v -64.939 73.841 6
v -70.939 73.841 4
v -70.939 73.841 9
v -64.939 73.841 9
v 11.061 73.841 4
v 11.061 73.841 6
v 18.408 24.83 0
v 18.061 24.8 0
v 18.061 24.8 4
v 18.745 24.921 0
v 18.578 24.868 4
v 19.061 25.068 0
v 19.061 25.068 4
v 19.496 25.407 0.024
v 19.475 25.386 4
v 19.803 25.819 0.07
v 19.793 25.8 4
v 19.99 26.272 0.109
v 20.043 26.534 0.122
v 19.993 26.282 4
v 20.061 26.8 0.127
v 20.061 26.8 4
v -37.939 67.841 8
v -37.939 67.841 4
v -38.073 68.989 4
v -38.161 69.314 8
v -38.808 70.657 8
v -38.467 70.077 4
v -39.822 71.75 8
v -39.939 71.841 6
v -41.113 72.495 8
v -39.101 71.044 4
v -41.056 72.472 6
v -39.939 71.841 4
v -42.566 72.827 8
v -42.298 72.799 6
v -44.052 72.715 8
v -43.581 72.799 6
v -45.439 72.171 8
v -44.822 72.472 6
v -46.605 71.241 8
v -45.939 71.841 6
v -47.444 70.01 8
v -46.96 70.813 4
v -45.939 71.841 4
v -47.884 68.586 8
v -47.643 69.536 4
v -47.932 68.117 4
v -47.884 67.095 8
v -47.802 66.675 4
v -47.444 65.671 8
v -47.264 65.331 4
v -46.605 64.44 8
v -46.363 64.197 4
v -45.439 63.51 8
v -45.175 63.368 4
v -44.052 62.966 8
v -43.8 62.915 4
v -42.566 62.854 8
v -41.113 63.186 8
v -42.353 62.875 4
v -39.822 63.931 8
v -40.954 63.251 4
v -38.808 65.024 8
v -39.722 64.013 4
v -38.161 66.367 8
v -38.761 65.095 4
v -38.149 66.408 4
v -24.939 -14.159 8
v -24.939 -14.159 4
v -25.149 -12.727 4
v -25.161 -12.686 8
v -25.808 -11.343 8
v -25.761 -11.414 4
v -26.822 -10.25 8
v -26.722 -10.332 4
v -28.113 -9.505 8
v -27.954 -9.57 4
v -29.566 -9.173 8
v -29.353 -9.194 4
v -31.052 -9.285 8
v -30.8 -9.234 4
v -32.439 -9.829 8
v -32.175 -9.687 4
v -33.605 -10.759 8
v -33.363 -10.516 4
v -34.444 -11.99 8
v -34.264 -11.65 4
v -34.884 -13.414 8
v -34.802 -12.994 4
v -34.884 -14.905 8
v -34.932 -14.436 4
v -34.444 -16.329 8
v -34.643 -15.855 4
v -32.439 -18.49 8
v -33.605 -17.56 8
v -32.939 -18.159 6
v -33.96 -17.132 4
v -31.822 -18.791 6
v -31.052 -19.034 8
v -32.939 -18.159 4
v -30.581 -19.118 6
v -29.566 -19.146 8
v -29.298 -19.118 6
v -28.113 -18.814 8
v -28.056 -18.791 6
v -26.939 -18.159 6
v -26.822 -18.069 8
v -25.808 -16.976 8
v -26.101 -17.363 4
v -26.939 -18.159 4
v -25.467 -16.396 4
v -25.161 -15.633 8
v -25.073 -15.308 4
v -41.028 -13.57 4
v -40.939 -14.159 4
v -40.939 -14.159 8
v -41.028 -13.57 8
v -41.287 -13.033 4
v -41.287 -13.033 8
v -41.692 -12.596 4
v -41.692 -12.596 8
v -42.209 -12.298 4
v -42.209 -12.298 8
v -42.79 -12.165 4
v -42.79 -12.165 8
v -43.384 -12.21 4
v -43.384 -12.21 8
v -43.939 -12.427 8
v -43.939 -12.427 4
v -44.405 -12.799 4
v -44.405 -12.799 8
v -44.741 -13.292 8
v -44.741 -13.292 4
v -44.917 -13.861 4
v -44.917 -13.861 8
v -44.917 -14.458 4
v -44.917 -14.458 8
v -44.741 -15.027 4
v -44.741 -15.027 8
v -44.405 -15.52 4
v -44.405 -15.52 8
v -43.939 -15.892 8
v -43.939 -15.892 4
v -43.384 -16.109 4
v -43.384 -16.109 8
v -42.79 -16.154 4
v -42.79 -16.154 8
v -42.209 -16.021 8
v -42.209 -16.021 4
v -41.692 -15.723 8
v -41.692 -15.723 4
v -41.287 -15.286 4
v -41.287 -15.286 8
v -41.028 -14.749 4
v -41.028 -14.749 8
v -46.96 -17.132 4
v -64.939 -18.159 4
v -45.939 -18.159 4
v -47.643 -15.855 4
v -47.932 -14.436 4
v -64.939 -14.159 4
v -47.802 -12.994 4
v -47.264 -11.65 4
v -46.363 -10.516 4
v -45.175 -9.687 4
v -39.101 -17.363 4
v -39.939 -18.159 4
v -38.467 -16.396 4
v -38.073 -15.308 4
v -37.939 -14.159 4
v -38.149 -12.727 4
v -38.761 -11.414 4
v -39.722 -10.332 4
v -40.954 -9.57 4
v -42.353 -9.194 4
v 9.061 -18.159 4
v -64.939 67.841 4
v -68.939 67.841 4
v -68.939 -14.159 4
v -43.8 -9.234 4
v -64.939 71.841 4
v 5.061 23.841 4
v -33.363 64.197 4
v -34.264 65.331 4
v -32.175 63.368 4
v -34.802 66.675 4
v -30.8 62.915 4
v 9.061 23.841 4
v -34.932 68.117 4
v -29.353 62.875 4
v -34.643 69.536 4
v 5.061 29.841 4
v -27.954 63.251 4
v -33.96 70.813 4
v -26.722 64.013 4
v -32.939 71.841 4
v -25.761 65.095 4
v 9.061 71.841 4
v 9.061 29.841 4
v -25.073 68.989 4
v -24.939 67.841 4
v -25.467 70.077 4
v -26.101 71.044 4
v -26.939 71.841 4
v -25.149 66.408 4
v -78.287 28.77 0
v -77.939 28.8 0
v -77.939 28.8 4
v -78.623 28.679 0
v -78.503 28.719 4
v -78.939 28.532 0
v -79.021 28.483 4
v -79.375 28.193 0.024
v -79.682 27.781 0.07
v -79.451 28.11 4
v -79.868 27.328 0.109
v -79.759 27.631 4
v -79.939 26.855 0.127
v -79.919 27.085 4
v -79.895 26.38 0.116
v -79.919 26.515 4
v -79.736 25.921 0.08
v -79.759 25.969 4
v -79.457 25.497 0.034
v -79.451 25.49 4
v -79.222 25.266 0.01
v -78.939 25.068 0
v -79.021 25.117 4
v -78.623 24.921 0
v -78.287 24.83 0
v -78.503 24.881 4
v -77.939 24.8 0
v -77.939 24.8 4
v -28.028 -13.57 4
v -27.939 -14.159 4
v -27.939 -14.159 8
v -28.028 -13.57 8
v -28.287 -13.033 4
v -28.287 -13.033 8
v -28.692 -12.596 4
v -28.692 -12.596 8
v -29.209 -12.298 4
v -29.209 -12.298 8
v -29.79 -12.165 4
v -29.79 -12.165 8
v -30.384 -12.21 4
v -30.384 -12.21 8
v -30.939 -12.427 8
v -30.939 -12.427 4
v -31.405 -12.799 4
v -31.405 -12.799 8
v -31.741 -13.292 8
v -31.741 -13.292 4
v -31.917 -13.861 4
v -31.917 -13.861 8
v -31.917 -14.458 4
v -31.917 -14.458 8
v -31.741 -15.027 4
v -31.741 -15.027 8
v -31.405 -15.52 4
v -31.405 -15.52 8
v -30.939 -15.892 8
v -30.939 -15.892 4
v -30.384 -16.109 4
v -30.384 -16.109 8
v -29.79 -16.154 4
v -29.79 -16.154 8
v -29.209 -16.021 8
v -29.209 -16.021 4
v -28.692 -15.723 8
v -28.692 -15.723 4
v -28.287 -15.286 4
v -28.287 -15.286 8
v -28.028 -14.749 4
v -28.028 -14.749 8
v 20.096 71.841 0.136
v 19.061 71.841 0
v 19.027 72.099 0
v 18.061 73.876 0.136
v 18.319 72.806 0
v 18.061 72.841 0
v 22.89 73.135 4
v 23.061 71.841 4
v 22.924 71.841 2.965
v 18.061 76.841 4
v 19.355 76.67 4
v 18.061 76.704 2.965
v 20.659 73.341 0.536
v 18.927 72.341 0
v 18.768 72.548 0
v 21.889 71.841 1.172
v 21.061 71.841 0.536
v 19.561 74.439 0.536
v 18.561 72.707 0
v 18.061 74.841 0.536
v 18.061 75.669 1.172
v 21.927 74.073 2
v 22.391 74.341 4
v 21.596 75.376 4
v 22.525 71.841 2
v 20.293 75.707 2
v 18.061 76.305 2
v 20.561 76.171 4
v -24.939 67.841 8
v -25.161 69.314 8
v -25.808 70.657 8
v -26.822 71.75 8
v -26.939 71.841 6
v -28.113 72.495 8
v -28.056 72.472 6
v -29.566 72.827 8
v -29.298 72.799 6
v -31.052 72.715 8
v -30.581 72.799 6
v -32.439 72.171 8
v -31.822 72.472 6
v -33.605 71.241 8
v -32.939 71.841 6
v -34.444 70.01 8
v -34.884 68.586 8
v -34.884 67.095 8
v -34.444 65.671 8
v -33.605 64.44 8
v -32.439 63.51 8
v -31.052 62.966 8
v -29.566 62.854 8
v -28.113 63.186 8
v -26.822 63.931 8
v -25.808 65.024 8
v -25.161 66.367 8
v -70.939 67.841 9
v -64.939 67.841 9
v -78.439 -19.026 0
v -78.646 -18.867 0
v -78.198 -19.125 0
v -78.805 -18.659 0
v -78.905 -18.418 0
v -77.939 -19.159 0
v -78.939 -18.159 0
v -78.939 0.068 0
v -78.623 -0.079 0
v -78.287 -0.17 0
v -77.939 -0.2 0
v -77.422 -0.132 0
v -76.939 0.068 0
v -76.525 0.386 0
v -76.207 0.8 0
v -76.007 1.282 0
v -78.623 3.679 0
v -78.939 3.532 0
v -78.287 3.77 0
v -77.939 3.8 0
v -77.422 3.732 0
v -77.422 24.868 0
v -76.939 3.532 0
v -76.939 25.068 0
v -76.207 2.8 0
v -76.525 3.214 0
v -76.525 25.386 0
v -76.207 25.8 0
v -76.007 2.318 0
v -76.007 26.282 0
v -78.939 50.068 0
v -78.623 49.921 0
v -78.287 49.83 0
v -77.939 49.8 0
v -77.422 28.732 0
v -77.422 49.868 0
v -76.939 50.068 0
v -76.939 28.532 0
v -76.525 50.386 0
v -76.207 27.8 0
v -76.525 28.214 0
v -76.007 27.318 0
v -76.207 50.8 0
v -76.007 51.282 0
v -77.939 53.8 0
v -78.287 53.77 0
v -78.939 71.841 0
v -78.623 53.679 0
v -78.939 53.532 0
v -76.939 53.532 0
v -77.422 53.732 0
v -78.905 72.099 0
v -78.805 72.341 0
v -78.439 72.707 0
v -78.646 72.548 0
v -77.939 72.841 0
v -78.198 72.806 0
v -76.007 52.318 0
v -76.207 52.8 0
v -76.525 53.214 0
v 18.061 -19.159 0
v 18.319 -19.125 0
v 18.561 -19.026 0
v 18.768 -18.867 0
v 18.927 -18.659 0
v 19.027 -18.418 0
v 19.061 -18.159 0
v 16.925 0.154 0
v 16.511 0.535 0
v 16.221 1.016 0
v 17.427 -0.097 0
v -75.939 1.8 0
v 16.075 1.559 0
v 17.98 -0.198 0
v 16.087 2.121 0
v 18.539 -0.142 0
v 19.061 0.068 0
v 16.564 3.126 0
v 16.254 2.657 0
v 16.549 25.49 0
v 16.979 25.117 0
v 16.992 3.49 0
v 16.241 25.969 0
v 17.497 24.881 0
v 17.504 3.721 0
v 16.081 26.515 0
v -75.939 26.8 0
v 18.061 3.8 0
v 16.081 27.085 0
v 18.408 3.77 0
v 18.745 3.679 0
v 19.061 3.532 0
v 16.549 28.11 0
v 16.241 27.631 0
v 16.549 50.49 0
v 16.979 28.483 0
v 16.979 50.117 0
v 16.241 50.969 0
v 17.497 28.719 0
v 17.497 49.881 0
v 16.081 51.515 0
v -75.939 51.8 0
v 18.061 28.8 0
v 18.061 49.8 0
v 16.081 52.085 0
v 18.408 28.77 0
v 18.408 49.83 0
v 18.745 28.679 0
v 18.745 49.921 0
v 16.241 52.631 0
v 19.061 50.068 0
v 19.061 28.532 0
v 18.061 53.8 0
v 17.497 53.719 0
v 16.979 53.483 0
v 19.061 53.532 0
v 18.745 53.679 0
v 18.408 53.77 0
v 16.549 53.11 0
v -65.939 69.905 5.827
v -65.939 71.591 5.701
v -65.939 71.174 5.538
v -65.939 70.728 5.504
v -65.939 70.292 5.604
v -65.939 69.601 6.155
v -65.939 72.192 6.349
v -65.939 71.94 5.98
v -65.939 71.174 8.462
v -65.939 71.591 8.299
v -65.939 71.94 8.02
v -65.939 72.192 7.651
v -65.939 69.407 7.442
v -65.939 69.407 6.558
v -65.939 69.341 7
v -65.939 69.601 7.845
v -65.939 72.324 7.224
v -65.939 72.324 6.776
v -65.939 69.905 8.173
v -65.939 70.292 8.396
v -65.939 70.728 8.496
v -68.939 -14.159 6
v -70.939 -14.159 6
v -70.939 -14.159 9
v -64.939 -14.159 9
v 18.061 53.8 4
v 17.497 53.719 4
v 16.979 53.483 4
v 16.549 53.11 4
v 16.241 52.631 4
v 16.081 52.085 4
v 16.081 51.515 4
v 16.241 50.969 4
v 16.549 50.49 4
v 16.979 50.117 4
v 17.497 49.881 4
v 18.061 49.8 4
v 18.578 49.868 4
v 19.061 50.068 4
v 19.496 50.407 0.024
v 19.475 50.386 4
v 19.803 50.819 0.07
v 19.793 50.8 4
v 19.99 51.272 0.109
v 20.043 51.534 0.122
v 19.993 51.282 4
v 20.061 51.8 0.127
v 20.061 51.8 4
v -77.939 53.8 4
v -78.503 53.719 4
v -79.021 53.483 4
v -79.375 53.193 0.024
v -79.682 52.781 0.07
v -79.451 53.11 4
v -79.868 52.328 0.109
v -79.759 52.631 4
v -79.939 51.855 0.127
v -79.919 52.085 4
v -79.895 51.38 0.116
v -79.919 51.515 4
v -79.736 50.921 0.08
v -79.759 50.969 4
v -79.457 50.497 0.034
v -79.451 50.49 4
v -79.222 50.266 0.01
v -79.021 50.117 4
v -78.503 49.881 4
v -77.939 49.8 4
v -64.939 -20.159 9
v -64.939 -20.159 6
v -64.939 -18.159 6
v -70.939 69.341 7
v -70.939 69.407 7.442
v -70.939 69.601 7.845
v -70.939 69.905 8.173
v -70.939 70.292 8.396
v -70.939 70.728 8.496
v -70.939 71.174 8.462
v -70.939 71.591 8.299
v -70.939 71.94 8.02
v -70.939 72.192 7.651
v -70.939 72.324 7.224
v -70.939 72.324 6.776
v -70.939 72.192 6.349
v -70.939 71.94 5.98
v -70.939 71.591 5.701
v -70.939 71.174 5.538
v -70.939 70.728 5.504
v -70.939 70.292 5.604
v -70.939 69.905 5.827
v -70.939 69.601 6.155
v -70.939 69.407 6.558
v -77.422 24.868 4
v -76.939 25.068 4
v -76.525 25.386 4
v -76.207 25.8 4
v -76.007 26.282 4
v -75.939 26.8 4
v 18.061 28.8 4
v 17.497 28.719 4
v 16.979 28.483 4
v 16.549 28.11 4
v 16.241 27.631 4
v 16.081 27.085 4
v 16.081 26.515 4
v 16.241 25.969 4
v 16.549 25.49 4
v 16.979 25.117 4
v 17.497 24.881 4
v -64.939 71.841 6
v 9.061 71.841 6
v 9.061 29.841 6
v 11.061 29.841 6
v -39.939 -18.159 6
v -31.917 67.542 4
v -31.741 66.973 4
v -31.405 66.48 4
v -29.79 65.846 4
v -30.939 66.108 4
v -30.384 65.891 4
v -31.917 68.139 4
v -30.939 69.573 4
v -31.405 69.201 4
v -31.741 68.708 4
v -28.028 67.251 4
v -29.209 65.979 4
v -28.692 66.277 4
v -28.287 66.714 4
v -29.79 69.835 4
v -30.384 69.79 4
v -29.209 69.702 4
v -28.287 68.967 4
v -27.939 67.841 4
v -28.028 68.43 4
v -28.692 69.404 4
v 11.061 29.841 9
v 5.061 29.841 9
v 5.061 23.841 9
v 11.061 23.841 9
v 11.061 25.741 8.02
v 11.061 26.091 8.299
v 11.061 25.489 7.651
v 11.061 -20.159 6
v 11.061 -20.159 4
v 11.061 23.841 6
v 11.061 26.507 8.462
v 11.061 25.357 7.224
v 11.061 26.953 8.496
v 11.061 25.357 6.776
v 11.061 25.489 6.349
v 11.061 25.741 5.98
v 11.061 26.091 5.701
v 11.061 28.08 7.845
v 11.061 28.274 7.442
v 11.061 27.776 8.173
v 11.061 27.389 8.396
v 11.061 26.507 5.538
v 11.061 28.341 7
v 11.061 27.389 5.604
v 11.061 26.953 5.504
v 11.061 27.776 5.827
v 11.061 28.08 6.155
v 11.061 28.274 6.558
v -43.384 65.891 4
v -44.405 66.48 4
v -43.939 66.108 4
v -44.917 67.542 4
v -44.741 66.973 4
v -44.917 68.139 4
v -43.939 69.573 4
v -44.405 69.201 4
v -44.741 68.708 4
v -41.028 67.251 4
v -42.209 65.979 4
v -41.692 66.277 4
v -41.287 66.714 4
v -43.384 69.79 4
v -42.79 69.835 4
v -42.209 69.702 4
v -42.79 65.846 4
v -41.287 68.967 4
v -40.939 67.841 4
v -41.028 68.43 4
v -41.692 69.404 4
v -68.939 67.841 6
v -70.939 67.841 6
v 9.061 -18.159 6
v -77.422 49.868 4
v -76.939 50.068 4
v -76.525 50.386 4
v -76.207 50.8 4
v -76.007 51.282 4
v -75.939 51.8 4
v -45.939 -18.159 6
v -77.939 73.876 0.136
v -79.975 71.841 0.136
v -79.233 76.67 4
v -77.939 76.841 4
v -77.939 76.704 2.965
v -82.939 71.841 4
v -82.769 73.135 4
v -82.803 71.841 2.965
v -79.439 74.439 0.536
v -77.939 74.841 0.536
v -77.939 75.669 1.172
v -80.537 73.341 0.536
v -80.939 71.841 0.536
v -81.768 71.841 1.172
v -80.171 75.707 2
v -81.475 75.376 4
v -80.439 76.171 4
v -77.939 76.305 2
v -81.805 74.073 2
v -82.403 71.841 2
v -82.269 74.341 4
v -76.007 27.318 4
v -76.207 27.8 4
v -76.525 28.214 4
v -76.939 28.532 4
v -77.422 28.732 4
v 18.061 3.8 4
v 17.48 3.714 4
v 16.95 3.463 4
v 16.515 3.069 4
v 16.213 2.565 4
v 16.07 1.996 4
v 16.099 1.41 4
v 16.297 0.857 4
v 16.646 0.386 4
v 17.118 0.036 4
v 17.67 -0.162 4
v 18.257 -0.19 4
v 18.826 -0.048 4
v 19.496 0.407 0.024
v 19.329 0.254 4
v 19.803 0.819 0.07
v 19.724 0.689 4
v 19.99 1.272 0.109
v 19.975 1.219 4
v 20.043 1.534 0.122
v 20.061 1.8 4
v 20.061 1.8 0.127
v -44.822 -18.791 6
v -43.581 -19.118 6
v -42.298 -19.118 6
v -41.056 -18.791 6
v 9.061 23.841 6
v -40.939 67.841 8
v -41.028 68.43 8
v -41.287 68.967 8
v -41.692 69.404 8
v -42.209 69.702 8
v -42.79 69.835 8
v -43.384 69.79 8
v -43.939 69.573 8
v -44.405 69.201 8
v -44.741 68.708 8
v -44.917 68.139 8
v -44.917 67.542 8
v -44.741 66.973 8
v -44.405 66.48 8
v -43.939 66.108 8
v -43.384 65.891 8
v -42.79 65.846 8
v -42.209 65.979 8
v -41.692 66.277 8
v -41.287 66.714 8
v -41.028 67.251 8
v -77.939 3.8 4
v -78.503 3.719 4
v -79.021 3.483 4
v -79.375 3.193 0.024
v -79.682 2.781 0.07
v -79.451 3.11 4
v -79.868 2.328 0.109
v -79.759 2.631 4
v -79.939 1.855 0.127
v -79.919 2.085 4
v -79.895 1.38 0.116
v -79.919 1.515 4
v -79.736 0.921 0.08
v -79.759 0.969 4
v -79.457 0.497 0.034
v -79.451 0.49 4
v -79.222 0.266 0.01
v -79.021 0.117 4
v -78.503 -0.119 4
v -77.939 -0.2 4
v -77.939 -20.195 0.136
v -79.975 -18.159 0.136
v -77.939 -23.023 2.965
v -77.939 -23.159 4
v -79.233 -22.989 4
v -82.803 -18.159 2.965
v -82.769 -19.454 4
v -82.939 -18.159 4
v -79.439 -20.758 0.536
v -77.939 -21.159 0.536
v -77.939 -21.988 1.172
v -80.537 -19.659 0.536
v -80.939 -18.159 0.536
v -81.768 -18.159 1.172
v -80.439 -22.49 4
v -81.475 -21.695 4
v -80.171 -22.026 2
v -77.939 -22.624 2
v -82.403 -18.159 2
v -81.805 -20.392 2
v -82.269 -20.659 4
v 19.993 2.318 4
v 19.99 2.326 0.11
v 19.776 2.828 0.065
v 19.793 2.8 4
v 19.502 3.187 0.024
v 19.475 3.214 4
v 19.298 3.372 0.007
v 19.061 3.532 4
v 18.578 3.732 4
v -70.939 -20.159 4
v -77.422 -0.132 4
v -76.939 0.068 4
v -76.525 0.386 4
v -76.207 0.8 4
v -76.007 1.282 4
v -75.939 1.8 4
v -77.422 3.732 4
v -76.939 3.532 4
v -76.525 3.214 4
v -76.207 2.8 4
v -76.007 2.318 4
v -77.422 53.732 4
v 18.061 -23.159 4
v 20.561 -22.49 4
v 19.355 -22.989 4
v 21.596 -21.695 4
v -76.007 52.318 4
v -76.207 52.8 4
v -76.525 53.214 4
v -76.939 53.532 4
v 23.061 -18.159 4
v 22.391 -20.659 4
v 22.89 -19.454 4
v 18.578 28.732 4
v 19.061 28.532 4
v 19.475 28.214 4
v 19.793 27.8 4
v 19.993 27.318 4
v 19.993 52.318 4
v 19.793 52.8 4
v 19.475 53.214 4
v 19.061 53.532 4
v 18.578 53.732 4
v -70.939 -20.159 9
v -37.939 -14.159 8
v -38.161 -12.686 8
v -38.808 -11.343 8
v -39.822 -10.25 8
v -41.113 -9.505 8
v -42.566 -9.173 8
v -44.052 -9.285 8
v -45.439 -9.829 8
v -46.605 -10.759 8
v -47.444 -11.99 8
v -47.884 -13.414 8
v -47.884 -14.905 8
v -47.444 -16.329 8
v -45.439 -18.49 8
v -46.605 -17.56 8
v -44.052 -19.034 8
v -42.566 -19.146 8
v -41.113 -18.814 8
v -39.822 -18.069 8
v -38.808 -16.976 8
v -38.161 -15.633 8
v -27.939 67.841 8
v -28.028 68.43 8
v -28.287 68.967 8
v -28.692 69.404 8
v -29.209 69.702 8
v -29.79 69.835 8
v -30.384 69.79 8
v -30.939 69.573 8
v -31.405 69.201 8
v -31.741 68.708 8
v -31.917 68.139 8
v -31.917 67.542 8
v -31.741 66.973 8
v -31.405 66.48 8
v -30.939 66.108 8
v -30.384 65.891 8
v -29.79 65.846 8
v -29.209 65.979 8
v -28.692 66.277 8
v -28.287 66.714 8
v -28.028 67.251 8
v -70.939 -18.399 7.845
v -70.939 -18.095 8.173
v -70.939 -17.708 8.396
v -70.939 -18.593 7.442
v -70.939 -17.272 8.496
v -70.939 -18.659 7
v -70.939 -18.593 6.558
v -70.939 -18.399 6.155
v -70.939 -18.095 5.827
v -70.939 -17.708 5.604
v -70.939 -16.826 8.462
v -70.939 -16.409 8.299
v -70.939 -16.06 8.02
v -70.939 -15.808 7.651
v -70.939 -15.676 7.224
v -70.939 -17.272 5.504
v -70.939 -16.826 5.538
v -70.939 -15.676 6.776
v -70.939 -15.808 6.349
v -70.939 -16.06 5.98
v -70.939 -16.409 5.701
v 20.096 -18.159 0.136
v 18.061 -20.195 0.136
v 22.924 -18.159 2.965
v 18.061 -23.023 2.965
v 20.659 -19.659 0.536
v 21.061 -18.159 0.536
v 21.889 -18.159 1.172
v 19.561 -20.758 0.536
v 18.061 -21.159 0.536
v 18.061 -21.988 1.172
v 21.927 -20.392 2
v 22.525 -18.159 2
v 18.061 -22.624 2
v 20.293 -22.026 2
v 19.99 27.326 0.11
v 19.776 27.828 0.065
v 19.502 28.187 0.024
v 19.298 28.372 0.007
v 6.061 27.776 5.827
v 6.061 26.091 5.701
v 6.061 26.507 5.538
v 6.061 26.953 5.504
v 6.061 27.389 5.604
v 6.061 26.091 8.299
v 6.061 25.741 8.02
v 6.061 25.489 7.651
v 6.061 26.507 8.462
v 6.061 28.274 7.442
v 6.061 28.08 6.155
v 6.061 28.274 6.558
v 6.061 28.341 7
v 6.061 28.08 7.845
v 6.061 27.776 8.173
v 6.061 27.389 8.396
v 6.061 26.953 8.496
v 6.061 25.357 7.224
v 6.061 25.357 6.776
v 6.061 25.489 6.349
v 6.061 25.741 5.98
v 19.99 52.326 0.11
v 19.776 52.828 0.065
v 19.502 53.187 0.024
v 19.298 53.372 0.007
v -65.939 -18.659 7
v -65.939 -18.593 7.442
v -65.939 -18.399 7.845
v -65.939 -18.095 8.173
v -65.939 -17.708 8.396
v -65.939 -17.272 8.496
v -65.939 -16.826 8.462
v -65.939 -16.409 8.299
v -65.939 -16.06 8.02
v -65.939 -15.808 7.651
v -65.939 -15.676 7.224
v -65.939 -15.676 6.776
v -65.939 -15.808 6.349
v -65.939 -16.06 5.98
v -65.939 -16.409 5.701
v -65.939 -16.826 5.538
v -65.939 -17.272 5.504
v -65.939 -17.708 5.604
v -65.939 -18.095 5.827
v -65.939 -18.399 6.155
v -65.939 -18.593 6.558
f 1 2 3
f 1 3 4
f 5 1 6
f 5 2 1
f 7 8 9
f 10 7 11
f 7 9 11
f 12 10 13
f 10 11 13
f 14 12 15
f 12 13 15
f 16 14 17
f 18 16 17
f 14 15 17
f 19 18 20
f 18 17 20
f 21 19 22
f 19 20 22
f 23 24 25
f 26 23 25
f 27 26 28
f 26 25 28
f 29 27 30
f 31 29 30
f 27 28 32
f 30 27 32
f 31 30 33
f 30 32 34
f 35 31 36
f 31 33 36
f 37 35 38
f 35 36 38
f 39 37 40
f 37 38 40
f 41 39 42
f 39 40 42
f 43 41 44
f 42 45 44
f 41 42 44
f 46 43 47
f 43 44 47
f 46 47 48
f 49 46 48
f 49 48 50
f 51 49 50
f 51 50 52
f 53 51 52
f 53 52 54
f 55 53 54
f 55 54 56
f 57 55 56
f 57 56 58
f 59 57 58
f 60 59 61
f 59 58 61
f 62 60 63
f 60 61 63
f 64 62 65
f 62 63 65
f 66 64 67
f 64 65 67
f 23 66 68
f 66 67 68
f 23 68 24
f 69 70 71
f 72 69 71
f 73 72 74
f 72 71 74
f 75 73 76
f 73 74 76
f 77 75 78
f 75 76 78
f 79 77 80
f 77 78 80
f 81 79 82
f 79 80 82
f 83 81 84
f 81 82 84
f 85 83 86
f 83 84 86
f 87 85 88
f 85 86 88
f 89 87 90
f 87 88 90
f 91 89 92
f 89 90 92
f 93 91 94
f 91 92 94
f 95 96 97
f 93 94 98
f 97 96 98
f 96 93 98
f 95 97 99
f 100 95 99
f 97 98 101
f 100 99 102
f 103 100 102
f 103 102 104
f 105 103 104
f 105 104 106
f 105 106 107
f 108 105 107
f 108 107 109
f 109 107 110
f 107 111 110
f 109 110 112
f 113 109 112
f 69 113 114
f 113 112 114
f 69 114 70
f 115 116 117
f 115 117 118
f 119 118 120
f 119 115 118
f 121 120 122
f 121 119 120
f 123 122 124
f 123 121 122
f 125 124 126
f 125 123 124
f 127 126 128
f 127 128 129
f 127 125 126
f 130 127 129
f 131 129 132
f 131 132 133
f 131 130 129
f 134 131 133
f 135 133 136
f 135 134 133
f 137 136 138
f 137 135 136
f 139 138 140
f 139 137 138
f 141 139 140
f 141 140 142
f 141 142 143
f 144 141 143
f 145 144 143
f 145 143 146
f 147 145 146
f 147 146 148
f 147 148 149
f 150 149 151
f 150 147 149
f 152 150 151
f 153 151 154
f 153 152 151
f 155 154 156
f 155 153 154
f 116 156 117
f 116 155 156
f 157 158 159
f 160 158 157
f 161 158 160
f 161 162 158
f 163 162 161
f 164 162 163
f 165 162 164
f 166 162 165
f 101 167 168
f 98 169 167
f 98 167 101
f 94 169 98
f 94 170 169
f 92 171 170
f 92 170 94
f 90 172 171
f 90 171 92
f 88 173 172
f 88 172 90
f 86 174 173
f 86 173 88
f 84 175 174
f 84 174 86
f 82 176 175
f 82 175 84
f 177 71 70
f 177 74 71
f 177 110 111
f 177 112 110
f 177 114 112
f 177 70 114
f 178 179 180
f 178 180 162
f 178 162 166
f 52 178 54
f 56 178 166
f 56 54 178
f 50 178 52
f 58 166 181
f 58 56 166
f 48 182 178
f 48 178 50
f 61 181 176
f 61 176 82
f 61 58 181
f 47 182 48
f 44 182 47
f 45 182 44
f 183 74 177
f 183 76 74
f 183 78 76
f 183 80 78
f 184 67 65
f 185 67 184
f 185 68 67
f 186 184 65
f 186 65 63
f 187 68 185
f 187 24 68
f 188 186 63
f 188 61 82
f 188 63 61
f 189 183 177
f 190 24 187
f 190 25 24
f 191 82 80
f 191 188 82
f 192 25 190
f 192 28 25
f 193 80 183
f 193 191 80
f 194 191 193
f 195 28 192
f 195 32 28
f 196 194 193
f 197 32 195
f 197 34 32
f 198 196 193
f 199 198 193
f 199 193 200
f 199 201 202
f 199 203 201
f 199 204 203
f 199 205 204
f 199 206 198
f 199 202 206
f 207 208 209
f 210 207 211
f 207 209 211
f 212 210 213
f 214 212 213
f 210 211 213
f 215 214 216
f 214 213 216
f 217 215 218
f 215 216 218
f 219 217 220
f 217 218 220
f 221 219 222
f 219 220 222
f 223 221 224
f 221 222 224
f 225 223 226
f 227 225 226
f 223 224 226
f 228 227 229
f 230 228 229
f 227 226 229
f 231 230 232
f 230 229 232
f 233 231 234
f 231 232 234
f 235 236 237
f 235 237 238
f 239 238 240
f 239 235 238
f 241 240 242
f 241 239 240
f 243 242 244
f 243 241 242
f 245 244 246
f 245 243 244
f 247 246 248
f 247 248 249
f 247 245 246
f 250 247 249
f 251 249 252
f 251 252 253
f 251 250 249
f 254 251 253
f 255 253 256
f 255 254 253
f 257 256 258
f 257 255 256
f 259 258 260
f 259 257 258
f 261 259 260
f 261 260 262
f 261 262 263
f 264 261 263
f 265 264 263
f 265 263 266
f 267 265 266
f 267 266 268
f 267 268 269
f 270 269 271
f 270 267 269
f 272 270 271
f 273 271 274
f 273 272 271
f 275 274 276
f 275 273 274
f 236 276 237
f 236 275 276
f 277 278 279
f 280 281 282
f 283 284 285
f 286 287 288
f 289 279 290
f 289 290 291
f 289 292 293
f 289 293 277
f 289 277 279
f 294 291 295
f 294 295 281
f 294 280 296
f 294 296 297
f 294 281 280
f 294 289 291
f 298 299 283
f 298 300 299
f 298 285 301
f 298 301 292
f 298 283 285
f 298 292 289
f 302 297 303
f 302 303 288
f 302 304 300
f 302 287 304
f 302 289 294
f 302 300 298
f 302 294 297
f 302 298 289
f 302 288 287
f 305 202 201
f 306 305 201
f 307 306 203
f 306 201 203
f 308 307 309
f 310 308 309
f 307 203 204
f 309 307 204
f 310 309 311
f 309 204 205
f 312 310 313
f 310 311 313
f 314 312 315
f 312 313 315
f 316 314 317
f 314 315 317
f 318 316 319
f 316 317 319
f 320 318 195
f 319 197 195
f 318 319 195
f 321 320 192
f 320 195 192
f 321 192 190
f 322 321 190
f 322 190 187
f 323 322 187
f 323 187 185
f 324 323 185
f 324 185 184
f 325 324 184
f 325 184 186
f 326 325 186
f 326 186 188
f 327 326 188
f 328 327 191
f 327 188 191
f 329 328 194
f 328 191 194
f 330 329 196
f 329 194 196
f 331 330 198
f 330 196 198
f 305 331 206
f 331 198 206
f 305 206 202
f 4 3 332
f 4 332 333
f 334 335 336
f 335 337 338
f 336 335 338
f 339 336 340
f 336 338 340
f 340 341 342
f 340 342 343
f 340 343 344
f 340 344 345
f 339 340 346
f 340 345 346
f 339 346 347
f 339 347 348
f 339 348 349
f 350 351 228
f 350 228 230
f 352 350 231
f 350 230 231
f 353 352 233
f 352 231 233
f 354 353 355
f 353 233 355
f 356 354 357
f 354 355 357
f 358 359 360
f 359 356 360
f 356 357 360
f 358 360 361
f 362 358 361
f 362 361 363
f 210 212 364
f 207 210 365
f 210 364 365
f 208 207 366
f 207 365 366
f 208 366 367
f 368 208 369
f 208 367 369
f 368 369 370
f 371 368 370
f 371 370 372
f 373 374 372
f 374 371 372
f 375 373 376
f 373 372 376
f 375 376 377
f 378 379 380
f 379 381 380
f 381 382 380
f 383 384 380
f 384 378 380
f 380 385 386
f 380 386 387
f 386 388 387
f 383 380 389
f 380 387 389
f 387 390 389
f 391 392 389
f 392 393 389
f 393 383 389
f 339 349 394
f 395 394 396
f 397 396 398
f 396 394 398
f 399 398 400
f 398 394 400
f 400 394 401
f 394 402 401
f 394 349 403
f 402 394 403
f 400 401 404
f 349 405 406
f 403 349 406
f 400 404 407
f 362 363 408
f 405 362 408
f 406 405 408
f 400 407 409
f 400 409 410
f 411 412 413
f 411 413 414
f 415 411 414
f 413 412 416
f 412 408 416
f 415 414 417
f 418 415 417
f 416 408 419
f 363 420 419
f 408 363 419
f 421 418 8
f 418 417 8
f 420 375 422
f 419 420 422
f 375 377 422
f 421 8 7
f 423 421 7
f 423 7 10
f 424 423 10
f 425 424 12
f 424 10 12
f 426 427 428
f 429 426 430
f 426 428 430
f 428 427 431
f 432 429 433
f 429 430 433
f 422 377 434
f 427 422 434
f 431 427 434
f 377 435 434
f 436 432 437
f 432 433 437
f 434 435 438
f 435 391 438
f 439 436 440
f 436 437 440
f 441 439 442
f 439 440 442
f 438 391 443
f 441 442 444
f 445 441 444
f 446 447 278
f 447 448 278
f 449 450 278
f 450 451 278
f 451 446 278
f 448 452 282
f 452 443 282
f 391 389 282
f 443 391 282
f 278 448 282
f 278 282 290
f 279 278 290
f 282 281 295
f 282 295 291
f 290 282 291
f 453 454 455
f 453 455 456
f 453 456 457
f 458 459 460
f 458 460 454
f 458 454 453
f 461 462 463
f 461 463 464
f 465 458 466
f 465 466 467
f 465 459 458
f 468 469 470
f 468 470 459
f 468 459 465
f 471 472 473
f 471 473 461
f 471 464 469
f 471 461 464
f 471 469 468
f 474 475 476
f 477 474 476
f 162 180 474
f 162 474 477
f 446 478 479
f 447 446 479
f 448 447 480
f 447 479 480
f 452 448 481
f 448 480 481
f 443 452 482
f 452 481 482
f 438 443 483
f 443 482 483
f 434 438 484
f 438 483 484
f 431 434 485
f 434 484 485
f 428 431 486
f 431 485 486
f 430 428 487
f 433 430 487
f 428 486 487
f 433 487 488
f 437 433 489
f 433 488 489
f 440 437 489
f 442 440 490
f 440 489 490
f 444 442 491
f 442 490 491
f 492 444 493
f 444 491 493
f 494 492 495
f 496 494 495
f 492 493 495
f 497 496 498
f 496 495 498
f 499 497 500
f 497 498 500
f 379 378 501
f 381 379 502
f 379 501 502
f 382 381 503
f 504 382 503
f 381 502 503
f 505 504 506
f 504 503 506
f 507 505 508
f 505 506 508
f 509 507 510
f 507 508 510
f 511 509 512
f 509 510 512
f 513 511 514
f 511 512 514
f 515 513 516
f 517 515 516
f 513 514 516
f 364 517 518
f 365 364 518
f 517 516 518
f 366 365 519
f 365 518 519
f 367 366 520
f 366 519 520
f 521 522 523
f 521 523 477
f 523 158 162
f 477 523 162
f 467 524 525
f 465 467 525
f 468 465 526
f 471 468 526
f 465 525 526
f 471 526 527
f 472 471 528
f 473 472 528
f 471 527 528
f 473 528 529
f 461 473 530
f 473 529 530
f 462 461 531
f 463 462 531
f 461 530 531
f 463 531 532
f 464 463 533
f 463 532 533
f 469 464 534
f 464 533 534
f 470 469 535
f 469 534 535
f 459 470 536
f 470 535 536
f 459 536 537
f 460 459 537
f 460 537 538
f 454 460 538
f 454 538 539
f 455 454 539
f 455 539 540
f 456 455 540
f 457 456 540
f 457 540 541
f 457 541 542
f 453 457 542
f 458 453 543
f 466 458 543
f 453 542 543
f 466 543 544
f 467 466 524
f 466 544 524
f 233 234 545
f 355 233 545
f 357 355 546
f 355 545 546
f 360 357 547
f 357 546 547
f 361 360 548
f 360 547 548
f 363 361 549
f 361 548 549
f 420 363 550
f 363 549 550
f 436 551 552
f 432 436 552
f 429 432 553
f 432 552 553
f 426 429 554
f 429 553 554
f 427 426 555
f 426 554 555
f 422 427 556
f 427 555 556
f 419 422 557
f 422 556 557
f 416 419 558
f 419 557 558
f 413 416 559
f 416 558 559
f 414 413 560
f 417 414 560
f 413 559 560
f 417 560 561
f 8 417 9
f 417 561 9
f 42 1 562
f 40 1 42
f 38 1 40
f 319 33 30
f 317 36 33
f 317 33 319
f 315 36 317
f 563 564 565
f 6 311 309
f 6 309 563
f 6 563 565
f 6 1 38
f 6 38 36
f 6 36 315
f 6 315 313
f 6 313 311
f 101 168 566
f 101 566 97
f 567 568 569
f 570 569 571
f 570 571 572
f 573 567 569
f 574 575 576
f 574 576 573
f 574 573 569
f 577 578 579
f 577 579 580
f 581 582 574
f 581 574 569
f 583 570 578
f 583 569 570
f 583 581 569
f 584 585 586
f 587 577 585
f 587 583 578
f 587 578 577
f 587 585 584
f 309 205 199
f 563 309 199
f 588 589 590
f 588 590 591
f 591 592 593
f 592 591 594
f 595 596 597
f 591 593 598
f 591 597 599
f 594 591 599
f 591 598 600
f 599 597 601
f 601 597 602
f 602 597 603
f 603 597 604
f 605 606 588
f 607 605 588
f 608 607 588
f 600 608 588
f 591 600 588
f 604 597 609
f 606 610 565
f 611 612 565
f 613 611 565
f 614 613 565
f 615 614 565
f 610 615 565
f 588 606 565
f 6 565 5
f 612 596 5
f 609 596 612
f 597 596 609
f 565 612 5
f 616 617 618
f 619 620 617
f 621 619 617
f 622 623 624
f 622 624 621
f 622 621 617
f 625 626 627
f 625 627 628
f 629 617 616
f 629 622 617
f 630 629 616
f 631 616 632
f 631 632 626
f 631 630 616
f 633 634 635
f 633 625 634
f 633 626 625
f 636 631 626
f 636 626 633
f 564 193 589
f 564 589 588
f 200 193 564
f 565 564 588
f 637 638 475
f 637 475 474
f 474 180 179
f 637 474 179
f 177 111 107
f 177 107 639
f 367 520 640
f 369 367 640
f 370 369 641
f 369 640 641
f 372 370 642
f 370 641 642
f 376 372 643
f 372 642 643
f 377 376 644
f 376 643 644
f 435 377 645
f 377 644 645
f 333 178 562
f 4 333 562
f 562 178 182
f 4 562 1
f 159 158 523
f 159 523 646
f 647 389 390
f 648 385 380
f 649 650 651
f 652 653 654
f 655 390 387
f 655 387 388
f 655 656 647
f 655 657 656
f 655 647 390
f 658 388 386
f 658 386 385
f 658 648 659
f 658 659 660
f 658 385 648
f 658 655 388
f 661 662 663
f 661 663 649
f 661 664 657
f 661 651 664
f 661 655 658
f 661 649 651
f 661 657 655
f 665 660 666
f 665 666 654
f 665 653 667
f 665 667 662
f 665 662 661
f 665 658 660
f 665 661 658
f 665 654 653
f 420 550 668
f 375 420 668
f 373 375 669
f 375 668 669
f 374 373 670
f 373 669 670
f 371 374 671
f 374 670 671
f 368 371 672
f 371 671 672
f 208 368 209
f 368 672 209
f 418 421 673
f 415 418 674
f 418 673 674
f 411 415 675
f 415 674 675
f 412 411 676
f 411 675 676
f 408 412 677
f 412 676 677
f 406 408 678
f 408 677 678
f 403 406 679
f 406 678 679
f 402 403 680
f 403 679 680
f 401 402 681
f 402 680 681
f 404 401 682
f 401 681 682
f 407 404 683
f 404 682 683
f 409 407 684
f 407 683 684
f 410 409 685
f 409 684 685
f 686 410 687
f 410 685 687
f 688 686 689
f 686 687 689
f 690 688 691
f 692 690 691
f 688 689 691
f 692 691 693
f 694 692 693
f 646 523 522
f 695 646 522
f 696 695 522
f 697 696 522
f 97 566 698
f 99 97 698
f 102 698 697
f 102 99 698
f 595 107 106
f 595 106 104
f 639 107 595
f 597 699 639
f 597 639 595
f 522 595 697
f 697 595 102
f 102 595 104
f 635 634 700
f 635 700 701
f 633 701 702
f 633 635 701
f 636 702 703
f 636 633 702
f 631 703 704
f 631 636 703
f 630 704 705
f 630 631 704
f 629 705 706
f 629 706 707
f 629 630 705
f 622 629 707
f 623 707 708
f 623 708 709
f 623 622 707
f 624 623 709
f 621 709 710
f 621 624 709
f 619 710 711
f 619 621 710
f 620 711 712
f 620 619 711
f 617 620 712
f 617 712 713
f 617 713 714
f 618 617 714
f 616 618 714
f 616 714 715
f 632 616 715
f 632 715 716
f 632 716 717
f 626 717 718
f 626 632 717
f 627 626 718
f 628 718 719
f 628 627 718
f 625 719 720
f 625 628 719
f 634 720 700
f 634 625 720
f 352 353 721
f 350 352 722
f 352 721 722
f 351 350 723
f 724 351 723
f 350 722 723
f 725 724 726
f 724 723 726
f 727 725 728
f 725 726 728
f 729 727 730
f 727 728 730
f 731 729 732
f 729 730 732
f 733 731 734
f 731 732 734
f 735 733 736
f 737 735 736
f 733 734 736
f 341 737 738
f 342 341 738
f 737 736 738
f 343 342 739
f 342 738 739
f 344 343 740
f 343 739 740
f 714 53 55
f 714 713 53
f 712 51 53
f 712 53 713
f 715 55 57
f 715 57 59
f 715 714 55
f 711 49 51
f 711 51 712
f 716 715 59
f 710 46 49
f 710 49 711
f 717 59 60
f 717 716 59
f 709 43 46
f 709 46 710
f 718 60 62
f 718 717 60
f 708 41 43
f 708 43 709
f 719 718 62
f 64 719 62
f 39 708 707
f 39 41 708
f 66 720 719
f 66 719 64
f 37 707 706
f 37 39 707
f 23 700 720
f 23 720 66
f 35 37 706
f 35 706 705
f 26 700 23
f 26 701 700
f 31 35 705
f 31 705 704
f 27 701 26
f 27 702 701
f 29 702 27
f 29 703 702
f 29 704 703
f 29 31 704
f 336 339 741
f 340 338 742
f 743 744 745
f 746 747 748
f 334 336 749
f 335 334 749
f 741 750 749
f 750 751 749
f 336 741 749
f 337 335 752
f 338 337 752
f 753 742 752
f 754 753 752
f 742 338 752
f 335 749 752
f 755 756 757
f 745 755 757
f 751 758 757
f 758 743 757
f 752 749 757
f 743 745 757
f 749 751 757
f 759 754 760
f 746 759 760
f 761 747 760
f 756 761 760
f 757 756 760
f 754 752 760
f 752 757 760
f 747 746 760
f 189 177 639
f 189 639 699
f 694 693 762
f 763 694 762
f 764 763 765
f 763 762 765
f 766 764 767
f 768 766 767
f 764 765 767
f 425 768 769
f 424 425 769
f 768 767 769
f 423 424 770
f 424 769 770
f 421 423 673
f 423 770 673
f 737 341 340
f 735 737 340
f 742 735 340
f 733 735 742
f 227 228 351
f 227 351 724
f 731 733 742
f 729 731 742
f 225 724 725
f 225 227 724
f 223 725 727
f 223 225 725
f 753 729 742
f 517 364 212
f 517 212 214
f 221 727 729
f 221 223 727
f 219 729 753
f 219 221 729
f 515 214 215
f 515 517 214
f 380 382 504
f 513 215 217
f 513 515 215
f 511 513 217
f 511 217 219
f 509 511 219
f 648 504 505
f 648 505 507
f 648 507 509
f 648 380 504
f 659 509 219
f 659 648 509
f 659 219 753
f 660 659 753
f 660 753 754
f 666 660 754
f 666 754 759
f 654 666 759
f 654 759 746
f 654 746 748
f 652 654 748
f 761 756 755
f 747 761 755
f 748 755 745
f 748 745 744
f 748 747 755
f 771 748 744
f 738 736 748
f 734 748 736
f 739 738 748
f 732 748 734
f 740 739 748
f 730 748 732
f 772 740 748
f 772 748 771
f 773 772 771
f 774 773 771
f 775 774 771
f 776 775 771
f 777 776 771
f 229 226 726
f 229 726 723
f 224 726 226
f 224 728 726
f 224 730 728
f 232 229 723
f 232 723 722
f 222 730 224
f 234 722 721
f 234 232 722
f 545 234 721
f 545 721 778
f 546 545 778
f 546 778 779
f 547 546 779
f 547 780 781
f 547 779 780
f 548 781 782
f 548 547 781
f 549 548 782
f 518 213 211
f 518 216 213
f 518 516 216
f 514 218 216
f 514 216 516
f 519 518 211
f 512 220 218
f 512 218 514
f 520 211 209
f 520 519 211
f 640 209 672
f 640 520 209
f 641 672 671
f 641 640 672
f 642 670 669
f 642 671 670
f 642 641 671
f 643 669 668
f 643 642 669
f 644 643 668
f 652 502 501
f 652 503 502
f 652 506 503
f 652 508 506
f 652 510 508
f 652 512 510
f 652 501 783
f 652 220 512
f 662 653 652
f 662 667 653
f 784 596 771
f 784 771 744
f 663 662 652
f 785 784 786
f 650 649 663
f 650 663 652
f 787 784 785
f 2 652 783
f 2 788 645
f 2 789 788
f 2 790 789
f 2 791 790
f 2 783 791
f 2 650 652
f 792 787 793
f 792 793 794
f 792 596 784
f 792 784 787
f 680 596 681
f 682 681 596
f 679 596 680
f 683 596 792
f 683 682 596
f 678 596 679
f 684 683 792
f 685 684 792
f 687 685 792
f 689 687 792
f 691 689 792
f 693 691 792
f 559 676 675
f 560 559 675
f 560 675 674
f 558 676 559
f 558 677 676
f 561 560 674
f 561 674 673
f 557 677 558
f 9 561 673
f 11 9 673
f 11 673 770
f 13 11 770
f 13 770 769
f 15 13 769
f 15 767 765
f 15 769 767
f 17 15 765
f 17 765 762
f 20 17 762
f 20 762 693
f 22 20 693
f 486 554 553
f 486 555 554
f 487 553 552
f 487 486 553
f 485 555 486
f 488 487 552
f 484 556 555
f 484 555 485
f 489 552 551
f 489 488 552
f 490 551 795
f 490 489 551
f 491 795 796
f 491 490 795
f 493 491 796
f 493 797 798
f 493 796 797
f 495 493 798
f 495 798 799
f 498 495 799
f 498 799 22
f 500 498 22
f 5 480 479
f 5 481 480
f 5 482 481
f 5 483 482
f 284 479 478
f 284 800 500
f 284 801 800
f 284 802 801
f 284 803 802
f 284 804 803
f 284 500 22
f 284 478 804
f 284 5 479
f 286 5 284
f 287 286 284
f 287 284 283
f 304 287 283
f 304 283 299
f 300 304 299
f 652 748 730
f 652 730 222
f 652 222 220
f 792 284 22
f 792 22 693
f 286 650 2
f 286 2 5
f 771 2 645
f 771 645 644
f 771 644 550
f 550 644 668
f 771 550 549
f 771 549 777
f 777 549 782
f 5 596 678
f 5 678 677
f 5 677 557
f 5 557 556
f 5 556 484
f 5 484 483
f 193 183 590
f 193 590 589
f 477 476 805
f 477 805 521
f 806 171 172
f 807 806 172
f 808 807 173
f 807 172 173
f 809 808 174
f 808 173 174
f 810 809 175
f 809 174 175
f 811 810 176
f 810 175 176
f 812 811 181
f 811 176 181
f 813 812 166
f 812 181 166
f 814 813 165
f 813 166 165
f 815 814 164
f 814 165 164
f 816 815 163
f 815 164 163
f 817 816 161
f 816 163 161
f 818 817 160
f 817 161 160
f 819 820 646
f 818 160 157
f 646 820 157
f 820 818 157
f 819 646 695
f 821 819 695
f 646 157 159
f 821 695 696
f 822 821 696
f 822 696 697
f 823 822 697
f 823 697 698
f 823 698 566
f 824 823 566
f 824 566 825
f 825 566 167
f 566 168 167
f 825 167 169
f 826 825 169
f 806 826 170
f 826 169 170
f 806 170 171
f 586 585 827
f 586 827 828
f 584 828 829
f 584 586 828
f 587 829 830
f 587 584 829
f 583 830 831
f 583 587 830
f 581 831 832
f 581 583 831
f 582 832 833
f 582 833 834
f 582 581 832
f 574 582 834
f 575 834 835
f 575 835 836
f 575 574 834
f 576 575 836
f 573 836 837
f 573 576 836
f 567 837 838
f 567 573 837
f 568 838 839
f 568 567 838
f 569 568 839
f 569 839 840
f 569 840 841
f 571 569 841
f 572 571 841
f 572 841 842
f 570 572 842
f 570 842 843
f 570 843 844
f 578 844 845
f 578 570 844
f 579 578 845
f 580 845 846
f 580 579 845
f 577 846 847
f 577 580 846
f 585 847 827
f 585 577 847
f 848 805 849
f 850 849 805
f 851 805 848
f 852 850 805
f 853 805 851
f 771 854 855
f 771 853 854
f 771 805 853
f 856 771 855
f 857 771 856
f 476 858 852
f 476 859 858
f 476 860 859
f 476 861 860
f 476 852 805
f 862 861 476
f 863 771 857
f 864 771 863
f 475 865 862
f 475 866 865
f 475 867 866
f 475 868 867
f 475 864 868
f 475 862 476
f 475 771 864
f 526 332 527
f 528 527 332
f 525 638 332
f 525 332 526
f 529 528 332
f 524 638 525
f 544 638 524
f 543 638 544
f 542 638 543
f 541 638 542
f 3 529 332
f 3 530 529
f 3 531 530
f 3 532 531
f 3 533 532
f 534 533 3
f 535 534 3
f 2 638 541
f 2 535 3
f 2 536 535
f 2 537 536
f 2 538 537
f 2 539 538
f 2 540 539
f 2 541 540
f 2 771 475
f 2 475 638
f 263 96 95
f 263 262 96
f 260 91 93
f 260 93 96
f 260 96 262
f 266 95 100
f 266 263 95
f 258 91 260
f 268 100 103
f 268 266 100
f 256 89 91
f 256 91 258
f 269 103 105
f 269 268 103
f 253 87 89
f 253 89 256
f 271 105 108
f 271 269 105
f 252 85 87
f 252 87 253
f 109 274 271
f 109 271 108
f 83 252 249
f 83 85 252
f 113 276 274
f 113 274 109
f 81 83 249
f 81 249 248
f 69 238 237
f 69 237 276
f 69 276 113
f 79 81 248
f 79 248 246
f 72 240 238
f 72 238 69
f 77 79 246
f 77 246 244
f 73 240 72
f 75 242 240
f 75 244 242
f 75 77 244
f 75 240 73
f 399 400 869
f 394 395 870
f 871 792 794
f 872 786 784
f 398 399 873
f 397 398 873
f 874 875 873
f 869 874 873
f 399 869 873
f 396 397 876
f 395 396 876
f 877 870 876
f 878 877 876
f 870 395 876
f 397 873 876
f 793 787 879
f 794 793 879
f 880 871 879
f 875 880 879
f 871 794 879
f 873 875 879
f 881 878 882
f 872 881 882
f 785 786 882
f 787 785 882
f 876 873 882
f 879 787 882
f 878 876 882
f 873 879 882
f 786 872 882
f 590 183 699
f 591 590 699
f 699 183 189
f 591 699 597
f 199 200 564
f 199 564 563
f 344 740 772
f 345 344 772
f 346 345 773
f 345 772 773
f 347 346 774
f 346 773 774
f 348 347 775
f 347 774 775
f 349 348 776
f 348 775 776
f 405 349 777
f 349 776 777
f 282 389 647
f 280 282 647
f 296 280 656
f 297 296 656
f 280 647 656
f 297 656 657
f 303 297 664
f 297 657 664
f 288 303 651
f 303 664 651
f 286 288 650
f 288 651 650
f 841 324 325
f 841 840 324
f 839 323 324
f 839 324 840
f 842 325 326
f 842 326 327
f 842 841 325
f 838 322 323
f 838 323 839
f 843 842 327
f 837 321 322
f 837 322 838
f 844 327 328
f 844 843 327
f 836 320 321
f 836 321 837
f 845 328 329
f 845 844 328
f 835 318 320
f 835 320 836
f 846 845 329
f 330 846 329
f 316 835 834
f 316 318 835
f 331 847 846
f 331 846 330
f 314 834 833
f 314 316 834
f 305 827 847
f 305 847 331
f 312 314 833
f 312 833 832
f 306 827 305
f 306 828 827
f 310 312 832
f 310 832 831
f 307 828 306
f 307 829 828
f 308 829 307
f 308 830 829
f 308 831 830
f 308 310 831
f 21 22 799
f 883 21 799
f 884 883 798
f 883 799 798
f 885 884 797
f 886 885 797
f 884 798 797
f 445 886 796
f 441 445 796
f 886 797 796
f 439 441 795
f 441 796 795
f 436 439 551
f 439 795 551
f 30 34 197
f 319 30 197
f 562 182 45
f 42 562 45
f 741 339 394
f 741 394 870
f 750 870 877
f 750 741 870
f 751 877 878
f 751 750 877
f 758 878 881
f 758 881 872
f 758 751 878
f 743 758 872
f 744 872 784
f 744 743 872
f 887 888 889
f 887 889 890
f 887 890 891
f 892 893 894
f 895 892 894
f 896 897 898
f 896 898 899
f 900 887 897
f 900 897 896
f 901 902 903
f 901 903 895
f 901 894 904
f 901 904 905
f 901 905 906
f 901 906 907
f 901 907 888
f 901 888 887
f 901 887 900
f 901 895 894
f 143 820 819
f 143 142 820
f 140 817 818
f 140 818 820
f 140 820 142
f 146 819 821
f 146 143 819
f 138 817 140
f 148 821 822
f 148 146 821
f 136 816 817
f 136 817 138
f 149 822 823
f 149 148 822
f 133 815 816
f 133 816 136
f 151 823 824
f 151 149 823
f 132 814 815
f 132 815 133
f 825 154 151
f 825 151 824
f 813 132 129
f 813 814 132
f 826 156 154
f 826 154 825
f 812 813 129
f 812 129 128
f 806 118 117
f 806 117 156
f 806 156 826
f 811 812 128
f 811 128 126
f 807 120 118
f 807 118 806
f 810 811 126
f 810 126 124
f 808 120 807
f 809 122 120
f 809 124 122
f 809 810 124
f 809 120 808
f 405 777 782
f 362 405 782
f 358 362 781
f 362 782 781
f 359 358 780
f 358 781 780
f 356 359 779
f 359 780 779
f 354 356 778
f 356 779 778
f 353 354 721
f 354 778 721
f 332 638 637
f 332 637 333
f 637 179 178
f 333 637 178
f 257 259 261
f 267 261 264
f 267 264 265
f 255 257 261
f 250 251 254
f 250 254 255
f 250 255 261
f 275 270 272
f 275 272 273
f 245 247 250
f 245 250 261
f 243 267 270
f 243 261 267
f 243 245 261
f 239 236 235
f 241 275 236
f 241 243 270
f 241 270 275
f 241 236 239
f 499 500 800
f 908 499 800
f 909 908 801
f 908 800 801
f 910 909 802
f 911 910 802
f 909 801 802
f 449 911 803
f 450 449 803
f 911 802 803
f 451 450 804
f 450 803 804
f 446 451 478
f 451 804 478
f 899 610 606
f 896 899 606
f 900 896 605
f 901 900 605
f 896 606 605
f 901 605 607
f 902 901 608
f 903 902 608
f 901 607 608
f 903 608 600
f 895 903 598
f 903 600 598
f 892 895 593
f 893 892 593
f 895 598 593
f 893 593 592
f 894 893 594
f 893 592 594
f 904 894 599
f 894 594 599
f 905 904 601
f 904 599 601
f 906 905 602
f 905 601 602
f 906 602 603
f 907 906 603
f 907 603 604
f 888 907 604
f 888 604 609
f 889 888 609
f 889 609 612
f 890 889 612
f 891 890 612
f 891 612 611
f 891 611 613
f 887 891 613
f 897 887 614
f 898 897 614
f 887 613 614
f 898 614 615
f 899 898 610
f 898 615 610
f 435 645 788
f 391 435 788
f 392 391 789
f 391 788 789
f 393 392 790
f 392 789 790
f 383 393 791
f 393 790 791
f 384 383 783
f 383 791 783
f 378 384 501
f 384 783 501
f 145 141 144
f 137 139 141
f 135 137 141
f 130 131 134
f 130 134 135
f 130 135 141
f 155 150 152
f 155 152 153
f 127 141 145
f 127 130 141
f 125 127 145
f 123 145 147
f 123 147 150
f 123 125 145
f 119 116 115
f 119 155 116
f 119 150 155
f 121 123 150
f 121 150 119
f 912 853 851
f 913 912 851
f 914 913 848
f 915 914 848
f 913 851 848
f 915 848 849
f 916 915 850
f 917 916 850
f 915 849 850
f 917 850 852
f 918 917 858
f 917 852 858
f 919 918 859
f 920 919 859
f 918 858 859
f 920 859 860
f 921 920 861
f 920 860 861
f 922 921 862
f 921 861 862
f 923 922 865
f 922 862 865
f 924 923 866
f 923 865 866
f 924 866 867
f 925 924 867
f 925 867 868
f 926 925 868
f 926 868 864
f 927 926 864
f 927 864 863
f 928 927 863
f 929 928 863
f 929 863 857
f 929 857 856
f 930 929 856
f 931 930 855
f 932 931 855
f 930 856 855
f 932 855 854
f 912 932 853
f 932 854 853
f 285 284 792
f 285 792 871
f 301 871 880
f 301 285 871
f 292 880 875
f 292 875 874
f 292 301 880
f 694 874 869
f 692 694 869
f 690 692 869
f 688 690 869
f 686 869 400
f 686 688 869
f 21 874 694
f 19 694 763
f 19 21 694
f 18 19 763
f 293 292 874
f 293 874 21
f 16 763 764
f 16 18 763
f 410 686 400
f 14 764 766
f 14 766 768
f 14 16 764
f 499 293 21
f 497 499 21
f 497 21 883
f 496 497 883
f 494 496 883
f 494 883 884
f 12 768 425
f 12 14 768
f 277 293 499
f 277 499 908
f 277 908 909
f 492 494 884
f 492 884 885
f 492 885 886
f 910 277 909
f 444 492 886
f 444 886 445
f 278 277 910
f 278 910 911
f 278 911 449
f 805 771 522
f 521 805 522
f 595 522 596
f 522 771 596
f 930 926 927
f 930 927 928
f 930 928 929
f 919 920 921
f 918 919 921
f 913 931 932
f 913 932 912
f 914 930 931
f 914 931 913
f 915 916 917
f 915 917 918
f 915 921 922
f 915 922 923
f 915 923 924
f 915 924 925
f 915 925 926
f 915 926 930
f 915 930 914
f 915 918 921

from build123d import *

# Parameters (mm, degrees)
F0_W          = 106
F0_H          = 100
F1_DEPTH      = 4
F2_W          = 82
F2_H          = 94
F2_W_2        = 78
F2_H_2        = 90
F5_DEPTH      = 2
F6_DEPTH      = 25
F4_R          = 5
F4_R_2        = 2
F7_DEPTH      = 4
F8_W          = 6
F8_H          = 6
F9_DEPTH      = 5
F10_R         = 1.5
F11_DEPTH     = 5
F12_W         = 6
F12_H         = 6
F13_DEPTH     = 5
F14_R         = 1.5
F15_DEPTH     = 5
F16_R         = 5
F17_T1_DEPTH  = 90
F17_T3_DEPTH  = 96
F17_T6_ANGLE  = 90
F17_T8_ANGLE  = 90
F17_T10_ANGLE = 90
F17_T12_ANGLE = 90


# Not quite as in the source:
# - a fillet or chamfer that OpenCascade refuses, or shapes differently, is made with other operations: its cross-section is extruded or revolved along the edge and cut away or added


with BuildPart() as f1:
    # F0 (on Top) → F1 (new body)
    with BuildSketch(Plane.XY):
        with Locations((-29.9393483698, 26.8405017372)):
            Rectangle(F0_W, F0_H)
    extrude(amount=F1_DEPTH)

    # F2 (on face) → F5 (join)
    with BuildSketch(Plane.XY.offset(4)):
        with Locations((-29.9393483698, 26.8405017372)):
            Rectangle(F2_W, F2_H)
        with Locations((-29.9393483698, 26.8405017372)):
            Rectangle(F2_W_2, F2_H_2, mode=Mode.SUBTRACT)
    extrude(amount=F5_DEPTH)

    # F3 (on face) → F6 (cut)
    with BuildSketch(Plane.XY.offset(4)):
        with BuildLine():
            ThreePointArc((-77.9393483698, 49.7999965698), (-76.5251348075, 50.3857830074), (-75.9393483698, 51.7999965698))
            ThreePointArc((-75.9393483698, 51.7999965698), (-76.5251348075, 53.2142101321), (-77.9393483698, 53.7999965698))
            Line((-77.9393483698, 53.7999965698), (-77.9393483698, 51.7999965698))
            Line((-77.9393483698, 51.7999965698), (-77.9393483698, 49.7999965698))
        make_face()
        with BuildLine():
            ThreePointArc((-75.9393483698, 1.7999965698), (-76.5251348075, 3.2142101321), (-77.9393483698, 3.7999965698))
            Line((-77.9393483698, 3.7999965698), (-77.9393483698, 1.7999965698))
            Line((-77.9393483698, 1.7999965698), (-77.9393483698, -0.2000034302))
            ThreePointArc((-77.9393483698, -0.2000034302), (-76.5251348075, 0.3857830074), (-75.9393483698, 1.7999965698))
        make_face()
        with BuildLine():
            Line((-77.9393483698, 1.7999965698), (-77.9393483698, 3.7999965698))
            ThreePointArc((-77.9393483698, 3.7999965698), (-79.9393483698, 1.7999965698), (-77.9393483698, -0.2000034302))
            Line((-77.9393483698, -0.2000034302), (-77.9393483698, 1.7999965698))
        make_face()
        with BuildLine():
            ThreePointArc((-75.9393483698, 26.7999965698), (-76.5251348075, 28.2142101321), (-77.9393483698, 28.7999965698))
            Line((-77.9393483698, 28.7999965698), (-77.9393483698, 26.7999965698))
            Line((-77.9393483698, 26.7999965698), (-77.9393483698, 24.7999965698))
            ThreePointArc((-77.9393483698, 24.7999965698), (-76.5251348075, 25.3857830074), (-75.9393483698, 26.7999965698))
        make_face()
        with BuildLine():
            Line((-77.9393483698, 26.7999965698), (-77.9393483698, 28.7999965698))
            ThreePointArc((-77.9393483698, 28.7999965698), (-79.9393483698, 26.7999965698), (-77.9393483698, 24.7999965698))
            Line((-77.9393483698, 24.7999965698), (-77.9393483698, 26.7999965698))
        make_face()
        with BuildLine():
            Line((-77.9393483698, 51.7999965698), (-77.9393483698, 53.7999965698))
            ThreePointArc((-77.9393483698, 53.7999965698), (-79.9393483698, 51.7999965698), (-77.9393483698, 49.7999965698))
            Line((-77.9393483698, 49.7999965698), (-77.9393483698, 51.7999965698))
        make_face()
        with BuildLine():
            ThreePointArc((18.0606516302, 49.7999965698), (19.4748651925, 50.3857830074), (20.0606516302, 51.7999965698))
            ThreePointArc((20.0606516302, 51.7999965698), (19.4748651925, 53.2142101321), (18.0606516302, 53.7999965698))
            Line((18.0606516302, 53.7999965698), (18.0606516302, 51.7999965698))
            Line((18.0606516302, 51.7999965698), (18.0606516302, 49.7999965698))
        make_face()
        with BuildLine():
            ThreePointArc((20.0606516302, 1.7999965698), (19.4748651925, 3.2142101321), (18.0606516302, 3.7999965698))
            ThreePointArc((18.0606516302, 3.7999965698), (16.6464380678, 0.3857830074), (20.0606516302, 1.7999965698))
        make_face()
        with BuildLine():
            ThreePointArc((20.0606516302, 26.7999965698), (19.4748651925, 28.2142101321), (18.0606516302, 28.7999965698))
            Line((18.0606516302, 28.7999965698), (18.0606516302, 26.7999965698))
            Line((18.0606516302, 26.7999965698), (18.0606516302, 24.7999965698))
            ThreePointArc((18.0606516302, 24.7999965698), (19.4748651925, 25.3857830074), (20.0606516302, 26.7999965698))
        make_face()
        with BuildLine():
            Line((18.0606516302, 26.7999965698), (18.0606516302, 28.7999965698))
            ThreePointArc((18.0606516302, 28.7999965698), (16.0606516302, 26.7999965698), (18.0606516302, 24.7999965698))
            Line((18.0606516302, 24.7999965698), (18.0606516302, 26.7999965698))
        make_face()
        with BuildLine():
            Line((18.0606516302, 51.7999965698), (18.0606516302, 53.7999965698))
            ThreePointArc((18.0606516302, 53.7999965698), (16.0606516302, 51.7999965698), (18.0606516302, 49.7999965698))
            Line((18.0606516302, 49.7999965698), (18.0606516302, 51.7999965698))
        make_face()
    extrude(amount=-F6_DEPTH, mode=Mode.SUBTRACT)

    # F4 (on face) → F7 (join)
    with BuildSketch(Plane.XY.offset(4)):
        with Locations((-42.9393483698, 67.8405017372)):
            Circle(F4_R)
        with Locations((-42.9393483698, 67.8405017372)):
            Circle(F4_R_2, mode=Mode.SUBTRACT)
        with Locations((-29.9393483698, 67.8405017372)):
            Circle(F4_R)
        with Locations((-29.9393483698, 67.8405017372)):
            Circle(F4_R_2, mode=Mode.SUBTRACT)
        with Locations((-42.9393483698, -14.1594982628)):
            Circle(F4_R)
        with Locations((-42.9393483698, -14.1594982628)):
            Circle(F4_R_2, mode=Mode.SUBTRACT)
        with Locations((-29.9393483698, -14.1594982628)):
            Circle(F4_R)
        with Locations((-29.9393483698, -14.1594982628)):
            Circle(F4_R_2, mode=Mode.SUBTRACT)
    extrude(amount=F7_DEPTH)

    # F8 (on face) → F9 (join)
    with BuildSketch(Plane.XY.offset(4)):
        with Locations((-67.9393483698, 70.8405017372)):
            Rectangle(F8_W, F8_H)
        with Locations((-67.9393483698, -17.1594982628)):
            Rectangle(F8_W, F8_H)
    extrude(amount=F9_DEPTH)

    # F10 (on face) → F11 (cut)
    with BuildSketch(Plane(origin=(-70.9393483698, 0, 0), x_dir=(0, -1, 0), z_dir=(-1, 0, 0))):
        with Locations((-70.8405017372, 7)):
            Circle(F10_R)
        with Locations((17.1594982628, 7)):
            Circle(F10_R)
    extrude(amount=-F11_DEPTH, mode=Mode.SUBTRACT)

    # F12 (on face) → F13 (join)
    with BuildSketch(Plane.XY.offset(4)):
        with Locations((8.0606516302, 26.8405017372)):
            Rectangle(F12_W, F12_H)
    extrude(amount=F13_DEPTH)

    # F14 (on face) → F15 (cut)
    with BuildSketch(Plane.YZ.offset(11.0606516302)):
        with Locations((26.8405017372, 7)):
            Circle(F14_R)
    extrude(amount=-F15_DEPTH, mode=Mode.SUBTRACT)

    # F16
    f16_edges = [f1.edges().sort_by_distance(p)[0] for p in [
        (-82.939348, 76.840502, 2),
        (23.060652, 76.840502, 2),
        (23.060652, -23.159498, 2),
        (-82.939348, -23.159498, 2),
    ]]
    fillet(f16_edges, radius=F16_R)

    # F17: fillet of radius 4 on 8 edges, made by hand

    # F17_s2 → F17_t1 (cut)
    with BuildSketch(Plane.XZ.offset(-71.8405017372)):
        with BuildLine():
            ThreePointArc((23.0606516302, 4), (21.8890787549, 1.1715728753), (19.0606516302, 0))
            Line((19.0606516302, 0), (23.0606516302, 0))
            Line((23.0606516302, 0), (23.0606516302, 4))
        make_face()
        with BuildLine():
            ThreePointArc((-78.9393483698, 0), (-81.7677754946, 1.1715728753), (-82.9393483698, 4))
            Line((-82.9393483698, 4), (-82.9393483698, 0))
            Line((-82.9393483698, 0), (-78.9393483698, 0))
        make_face()
    extrude(amount=F17_T1_DEPTH, mode=Mode.SUBTRACT)

    # F17_s4 → F17_t3 (cut)
    with BuildSketch(Plane.YZ.offset(-77.9393483698)):
        with BuildLine():
            ThreePointArc((-19.1594982628, 0), (-21.9879253875, 1.1715728753), (-23.1594982628, 4))
            Line((-23.1594982628, 4), (-23.1594982628, 0))
            Line((-23.1594982628, 0), (-19.1594982628, 0))
        make_face()
        with BuildLine():
            ThreePointArc((72.8405017372, 0), (75.668928862, 1.1715728753), (76.8405017372, 4))
            Line((76.8405017372, 4), (76.8405017372, 0))
            Line((76.8405017372, 0), (72.8405017372, 0))
        make_face()
    extrude(amount=F17_T3_DEPTH, mode=Mode.SUBTRACT)

    # F17_s5 → F17_t6 (revolve, cut)
    with BuildSketch(Plane.XZ.offset(18.1594982628)):
        with BuildLine():
            ThreePointArc((19.0606516302, 0), (21.8890787549, 1.1715728753), (23.0606516302, 4))
            Line((23.0606516302, 4), (23.0606516302, 0))
            Line((23.0606516302, 0), (19.0606516302, 0))
        make_face()
    revolve(axis=Axis((18.0606516302, -18.1594982628, 0), (0, 0, -1)), revolution_arc=F17_T6_ANGLE, mode=Mode.SUBTRACT)

    # F17_s7 → F17_t8 (revolve, cut)
    with BuildSketch(Plane.XZ.offset(-71.8405017372)):
        with BuildLine():
            ThreePointArc((19.0606516302, 0), (21.8890787549, 1.1715728753), (23.0606516302, 4))
            Line((23.0606516302, 4), (23.0606516302, 0))
            Line((23.0606516302, 0), (19.0606516302, 0))
        make_face()
    revolve(axis=Axis((18.0606516302, 71.8405017372, 0), (0, 0, 1)), revolution_arc=F17_T8_ANGLE, mode=Mode.SUBTRACT)

    # F17_s9 → F17_t10 (revolve, cut)
    with BuildSketch(Plane.YZ.offset(-77.9393483698)):
        with BuildLine():
            ThreePointArc((-19.1594982628, 0), (-21.9879253875, 1.1715728753), (-23.1594982628, 4))
            Line((-23.1594982628, 4), (-23.1594982628, 0))
            Line((-23.1594982628, 0), (-19.1594982628, 0))
        make_face()
    revolve(axis=Axis((-77.9393483698, -18.1594982628, 0), (0, 0, -1)), revolution_arc=F17_T10_ANGLE, mode=Mode.SUBTRACT)

    # F17_s11 → F17_t12 (revolve, cut)
    with BuildSketch(Plane.YZ.offset(-77.9393483698)):
        with BuildLine():
            ThreePointArc((72.8405017372, 0), (75.668928862, 1.1715728753), (76.8405017372, 4))
            Line((76.8405017372, 4), (76.8405017372, 0))
            Line((76.8405017372, 0), (72.8405017372, 0))
        make_face()
    revolve(axis=Axis((-77.9393483698, 71.8405017372, 0), (0, 0, 1)), revolution_arc=F17_T12_ANGLE, mode=Mode.SUBTRACT)


solid = f1.part
